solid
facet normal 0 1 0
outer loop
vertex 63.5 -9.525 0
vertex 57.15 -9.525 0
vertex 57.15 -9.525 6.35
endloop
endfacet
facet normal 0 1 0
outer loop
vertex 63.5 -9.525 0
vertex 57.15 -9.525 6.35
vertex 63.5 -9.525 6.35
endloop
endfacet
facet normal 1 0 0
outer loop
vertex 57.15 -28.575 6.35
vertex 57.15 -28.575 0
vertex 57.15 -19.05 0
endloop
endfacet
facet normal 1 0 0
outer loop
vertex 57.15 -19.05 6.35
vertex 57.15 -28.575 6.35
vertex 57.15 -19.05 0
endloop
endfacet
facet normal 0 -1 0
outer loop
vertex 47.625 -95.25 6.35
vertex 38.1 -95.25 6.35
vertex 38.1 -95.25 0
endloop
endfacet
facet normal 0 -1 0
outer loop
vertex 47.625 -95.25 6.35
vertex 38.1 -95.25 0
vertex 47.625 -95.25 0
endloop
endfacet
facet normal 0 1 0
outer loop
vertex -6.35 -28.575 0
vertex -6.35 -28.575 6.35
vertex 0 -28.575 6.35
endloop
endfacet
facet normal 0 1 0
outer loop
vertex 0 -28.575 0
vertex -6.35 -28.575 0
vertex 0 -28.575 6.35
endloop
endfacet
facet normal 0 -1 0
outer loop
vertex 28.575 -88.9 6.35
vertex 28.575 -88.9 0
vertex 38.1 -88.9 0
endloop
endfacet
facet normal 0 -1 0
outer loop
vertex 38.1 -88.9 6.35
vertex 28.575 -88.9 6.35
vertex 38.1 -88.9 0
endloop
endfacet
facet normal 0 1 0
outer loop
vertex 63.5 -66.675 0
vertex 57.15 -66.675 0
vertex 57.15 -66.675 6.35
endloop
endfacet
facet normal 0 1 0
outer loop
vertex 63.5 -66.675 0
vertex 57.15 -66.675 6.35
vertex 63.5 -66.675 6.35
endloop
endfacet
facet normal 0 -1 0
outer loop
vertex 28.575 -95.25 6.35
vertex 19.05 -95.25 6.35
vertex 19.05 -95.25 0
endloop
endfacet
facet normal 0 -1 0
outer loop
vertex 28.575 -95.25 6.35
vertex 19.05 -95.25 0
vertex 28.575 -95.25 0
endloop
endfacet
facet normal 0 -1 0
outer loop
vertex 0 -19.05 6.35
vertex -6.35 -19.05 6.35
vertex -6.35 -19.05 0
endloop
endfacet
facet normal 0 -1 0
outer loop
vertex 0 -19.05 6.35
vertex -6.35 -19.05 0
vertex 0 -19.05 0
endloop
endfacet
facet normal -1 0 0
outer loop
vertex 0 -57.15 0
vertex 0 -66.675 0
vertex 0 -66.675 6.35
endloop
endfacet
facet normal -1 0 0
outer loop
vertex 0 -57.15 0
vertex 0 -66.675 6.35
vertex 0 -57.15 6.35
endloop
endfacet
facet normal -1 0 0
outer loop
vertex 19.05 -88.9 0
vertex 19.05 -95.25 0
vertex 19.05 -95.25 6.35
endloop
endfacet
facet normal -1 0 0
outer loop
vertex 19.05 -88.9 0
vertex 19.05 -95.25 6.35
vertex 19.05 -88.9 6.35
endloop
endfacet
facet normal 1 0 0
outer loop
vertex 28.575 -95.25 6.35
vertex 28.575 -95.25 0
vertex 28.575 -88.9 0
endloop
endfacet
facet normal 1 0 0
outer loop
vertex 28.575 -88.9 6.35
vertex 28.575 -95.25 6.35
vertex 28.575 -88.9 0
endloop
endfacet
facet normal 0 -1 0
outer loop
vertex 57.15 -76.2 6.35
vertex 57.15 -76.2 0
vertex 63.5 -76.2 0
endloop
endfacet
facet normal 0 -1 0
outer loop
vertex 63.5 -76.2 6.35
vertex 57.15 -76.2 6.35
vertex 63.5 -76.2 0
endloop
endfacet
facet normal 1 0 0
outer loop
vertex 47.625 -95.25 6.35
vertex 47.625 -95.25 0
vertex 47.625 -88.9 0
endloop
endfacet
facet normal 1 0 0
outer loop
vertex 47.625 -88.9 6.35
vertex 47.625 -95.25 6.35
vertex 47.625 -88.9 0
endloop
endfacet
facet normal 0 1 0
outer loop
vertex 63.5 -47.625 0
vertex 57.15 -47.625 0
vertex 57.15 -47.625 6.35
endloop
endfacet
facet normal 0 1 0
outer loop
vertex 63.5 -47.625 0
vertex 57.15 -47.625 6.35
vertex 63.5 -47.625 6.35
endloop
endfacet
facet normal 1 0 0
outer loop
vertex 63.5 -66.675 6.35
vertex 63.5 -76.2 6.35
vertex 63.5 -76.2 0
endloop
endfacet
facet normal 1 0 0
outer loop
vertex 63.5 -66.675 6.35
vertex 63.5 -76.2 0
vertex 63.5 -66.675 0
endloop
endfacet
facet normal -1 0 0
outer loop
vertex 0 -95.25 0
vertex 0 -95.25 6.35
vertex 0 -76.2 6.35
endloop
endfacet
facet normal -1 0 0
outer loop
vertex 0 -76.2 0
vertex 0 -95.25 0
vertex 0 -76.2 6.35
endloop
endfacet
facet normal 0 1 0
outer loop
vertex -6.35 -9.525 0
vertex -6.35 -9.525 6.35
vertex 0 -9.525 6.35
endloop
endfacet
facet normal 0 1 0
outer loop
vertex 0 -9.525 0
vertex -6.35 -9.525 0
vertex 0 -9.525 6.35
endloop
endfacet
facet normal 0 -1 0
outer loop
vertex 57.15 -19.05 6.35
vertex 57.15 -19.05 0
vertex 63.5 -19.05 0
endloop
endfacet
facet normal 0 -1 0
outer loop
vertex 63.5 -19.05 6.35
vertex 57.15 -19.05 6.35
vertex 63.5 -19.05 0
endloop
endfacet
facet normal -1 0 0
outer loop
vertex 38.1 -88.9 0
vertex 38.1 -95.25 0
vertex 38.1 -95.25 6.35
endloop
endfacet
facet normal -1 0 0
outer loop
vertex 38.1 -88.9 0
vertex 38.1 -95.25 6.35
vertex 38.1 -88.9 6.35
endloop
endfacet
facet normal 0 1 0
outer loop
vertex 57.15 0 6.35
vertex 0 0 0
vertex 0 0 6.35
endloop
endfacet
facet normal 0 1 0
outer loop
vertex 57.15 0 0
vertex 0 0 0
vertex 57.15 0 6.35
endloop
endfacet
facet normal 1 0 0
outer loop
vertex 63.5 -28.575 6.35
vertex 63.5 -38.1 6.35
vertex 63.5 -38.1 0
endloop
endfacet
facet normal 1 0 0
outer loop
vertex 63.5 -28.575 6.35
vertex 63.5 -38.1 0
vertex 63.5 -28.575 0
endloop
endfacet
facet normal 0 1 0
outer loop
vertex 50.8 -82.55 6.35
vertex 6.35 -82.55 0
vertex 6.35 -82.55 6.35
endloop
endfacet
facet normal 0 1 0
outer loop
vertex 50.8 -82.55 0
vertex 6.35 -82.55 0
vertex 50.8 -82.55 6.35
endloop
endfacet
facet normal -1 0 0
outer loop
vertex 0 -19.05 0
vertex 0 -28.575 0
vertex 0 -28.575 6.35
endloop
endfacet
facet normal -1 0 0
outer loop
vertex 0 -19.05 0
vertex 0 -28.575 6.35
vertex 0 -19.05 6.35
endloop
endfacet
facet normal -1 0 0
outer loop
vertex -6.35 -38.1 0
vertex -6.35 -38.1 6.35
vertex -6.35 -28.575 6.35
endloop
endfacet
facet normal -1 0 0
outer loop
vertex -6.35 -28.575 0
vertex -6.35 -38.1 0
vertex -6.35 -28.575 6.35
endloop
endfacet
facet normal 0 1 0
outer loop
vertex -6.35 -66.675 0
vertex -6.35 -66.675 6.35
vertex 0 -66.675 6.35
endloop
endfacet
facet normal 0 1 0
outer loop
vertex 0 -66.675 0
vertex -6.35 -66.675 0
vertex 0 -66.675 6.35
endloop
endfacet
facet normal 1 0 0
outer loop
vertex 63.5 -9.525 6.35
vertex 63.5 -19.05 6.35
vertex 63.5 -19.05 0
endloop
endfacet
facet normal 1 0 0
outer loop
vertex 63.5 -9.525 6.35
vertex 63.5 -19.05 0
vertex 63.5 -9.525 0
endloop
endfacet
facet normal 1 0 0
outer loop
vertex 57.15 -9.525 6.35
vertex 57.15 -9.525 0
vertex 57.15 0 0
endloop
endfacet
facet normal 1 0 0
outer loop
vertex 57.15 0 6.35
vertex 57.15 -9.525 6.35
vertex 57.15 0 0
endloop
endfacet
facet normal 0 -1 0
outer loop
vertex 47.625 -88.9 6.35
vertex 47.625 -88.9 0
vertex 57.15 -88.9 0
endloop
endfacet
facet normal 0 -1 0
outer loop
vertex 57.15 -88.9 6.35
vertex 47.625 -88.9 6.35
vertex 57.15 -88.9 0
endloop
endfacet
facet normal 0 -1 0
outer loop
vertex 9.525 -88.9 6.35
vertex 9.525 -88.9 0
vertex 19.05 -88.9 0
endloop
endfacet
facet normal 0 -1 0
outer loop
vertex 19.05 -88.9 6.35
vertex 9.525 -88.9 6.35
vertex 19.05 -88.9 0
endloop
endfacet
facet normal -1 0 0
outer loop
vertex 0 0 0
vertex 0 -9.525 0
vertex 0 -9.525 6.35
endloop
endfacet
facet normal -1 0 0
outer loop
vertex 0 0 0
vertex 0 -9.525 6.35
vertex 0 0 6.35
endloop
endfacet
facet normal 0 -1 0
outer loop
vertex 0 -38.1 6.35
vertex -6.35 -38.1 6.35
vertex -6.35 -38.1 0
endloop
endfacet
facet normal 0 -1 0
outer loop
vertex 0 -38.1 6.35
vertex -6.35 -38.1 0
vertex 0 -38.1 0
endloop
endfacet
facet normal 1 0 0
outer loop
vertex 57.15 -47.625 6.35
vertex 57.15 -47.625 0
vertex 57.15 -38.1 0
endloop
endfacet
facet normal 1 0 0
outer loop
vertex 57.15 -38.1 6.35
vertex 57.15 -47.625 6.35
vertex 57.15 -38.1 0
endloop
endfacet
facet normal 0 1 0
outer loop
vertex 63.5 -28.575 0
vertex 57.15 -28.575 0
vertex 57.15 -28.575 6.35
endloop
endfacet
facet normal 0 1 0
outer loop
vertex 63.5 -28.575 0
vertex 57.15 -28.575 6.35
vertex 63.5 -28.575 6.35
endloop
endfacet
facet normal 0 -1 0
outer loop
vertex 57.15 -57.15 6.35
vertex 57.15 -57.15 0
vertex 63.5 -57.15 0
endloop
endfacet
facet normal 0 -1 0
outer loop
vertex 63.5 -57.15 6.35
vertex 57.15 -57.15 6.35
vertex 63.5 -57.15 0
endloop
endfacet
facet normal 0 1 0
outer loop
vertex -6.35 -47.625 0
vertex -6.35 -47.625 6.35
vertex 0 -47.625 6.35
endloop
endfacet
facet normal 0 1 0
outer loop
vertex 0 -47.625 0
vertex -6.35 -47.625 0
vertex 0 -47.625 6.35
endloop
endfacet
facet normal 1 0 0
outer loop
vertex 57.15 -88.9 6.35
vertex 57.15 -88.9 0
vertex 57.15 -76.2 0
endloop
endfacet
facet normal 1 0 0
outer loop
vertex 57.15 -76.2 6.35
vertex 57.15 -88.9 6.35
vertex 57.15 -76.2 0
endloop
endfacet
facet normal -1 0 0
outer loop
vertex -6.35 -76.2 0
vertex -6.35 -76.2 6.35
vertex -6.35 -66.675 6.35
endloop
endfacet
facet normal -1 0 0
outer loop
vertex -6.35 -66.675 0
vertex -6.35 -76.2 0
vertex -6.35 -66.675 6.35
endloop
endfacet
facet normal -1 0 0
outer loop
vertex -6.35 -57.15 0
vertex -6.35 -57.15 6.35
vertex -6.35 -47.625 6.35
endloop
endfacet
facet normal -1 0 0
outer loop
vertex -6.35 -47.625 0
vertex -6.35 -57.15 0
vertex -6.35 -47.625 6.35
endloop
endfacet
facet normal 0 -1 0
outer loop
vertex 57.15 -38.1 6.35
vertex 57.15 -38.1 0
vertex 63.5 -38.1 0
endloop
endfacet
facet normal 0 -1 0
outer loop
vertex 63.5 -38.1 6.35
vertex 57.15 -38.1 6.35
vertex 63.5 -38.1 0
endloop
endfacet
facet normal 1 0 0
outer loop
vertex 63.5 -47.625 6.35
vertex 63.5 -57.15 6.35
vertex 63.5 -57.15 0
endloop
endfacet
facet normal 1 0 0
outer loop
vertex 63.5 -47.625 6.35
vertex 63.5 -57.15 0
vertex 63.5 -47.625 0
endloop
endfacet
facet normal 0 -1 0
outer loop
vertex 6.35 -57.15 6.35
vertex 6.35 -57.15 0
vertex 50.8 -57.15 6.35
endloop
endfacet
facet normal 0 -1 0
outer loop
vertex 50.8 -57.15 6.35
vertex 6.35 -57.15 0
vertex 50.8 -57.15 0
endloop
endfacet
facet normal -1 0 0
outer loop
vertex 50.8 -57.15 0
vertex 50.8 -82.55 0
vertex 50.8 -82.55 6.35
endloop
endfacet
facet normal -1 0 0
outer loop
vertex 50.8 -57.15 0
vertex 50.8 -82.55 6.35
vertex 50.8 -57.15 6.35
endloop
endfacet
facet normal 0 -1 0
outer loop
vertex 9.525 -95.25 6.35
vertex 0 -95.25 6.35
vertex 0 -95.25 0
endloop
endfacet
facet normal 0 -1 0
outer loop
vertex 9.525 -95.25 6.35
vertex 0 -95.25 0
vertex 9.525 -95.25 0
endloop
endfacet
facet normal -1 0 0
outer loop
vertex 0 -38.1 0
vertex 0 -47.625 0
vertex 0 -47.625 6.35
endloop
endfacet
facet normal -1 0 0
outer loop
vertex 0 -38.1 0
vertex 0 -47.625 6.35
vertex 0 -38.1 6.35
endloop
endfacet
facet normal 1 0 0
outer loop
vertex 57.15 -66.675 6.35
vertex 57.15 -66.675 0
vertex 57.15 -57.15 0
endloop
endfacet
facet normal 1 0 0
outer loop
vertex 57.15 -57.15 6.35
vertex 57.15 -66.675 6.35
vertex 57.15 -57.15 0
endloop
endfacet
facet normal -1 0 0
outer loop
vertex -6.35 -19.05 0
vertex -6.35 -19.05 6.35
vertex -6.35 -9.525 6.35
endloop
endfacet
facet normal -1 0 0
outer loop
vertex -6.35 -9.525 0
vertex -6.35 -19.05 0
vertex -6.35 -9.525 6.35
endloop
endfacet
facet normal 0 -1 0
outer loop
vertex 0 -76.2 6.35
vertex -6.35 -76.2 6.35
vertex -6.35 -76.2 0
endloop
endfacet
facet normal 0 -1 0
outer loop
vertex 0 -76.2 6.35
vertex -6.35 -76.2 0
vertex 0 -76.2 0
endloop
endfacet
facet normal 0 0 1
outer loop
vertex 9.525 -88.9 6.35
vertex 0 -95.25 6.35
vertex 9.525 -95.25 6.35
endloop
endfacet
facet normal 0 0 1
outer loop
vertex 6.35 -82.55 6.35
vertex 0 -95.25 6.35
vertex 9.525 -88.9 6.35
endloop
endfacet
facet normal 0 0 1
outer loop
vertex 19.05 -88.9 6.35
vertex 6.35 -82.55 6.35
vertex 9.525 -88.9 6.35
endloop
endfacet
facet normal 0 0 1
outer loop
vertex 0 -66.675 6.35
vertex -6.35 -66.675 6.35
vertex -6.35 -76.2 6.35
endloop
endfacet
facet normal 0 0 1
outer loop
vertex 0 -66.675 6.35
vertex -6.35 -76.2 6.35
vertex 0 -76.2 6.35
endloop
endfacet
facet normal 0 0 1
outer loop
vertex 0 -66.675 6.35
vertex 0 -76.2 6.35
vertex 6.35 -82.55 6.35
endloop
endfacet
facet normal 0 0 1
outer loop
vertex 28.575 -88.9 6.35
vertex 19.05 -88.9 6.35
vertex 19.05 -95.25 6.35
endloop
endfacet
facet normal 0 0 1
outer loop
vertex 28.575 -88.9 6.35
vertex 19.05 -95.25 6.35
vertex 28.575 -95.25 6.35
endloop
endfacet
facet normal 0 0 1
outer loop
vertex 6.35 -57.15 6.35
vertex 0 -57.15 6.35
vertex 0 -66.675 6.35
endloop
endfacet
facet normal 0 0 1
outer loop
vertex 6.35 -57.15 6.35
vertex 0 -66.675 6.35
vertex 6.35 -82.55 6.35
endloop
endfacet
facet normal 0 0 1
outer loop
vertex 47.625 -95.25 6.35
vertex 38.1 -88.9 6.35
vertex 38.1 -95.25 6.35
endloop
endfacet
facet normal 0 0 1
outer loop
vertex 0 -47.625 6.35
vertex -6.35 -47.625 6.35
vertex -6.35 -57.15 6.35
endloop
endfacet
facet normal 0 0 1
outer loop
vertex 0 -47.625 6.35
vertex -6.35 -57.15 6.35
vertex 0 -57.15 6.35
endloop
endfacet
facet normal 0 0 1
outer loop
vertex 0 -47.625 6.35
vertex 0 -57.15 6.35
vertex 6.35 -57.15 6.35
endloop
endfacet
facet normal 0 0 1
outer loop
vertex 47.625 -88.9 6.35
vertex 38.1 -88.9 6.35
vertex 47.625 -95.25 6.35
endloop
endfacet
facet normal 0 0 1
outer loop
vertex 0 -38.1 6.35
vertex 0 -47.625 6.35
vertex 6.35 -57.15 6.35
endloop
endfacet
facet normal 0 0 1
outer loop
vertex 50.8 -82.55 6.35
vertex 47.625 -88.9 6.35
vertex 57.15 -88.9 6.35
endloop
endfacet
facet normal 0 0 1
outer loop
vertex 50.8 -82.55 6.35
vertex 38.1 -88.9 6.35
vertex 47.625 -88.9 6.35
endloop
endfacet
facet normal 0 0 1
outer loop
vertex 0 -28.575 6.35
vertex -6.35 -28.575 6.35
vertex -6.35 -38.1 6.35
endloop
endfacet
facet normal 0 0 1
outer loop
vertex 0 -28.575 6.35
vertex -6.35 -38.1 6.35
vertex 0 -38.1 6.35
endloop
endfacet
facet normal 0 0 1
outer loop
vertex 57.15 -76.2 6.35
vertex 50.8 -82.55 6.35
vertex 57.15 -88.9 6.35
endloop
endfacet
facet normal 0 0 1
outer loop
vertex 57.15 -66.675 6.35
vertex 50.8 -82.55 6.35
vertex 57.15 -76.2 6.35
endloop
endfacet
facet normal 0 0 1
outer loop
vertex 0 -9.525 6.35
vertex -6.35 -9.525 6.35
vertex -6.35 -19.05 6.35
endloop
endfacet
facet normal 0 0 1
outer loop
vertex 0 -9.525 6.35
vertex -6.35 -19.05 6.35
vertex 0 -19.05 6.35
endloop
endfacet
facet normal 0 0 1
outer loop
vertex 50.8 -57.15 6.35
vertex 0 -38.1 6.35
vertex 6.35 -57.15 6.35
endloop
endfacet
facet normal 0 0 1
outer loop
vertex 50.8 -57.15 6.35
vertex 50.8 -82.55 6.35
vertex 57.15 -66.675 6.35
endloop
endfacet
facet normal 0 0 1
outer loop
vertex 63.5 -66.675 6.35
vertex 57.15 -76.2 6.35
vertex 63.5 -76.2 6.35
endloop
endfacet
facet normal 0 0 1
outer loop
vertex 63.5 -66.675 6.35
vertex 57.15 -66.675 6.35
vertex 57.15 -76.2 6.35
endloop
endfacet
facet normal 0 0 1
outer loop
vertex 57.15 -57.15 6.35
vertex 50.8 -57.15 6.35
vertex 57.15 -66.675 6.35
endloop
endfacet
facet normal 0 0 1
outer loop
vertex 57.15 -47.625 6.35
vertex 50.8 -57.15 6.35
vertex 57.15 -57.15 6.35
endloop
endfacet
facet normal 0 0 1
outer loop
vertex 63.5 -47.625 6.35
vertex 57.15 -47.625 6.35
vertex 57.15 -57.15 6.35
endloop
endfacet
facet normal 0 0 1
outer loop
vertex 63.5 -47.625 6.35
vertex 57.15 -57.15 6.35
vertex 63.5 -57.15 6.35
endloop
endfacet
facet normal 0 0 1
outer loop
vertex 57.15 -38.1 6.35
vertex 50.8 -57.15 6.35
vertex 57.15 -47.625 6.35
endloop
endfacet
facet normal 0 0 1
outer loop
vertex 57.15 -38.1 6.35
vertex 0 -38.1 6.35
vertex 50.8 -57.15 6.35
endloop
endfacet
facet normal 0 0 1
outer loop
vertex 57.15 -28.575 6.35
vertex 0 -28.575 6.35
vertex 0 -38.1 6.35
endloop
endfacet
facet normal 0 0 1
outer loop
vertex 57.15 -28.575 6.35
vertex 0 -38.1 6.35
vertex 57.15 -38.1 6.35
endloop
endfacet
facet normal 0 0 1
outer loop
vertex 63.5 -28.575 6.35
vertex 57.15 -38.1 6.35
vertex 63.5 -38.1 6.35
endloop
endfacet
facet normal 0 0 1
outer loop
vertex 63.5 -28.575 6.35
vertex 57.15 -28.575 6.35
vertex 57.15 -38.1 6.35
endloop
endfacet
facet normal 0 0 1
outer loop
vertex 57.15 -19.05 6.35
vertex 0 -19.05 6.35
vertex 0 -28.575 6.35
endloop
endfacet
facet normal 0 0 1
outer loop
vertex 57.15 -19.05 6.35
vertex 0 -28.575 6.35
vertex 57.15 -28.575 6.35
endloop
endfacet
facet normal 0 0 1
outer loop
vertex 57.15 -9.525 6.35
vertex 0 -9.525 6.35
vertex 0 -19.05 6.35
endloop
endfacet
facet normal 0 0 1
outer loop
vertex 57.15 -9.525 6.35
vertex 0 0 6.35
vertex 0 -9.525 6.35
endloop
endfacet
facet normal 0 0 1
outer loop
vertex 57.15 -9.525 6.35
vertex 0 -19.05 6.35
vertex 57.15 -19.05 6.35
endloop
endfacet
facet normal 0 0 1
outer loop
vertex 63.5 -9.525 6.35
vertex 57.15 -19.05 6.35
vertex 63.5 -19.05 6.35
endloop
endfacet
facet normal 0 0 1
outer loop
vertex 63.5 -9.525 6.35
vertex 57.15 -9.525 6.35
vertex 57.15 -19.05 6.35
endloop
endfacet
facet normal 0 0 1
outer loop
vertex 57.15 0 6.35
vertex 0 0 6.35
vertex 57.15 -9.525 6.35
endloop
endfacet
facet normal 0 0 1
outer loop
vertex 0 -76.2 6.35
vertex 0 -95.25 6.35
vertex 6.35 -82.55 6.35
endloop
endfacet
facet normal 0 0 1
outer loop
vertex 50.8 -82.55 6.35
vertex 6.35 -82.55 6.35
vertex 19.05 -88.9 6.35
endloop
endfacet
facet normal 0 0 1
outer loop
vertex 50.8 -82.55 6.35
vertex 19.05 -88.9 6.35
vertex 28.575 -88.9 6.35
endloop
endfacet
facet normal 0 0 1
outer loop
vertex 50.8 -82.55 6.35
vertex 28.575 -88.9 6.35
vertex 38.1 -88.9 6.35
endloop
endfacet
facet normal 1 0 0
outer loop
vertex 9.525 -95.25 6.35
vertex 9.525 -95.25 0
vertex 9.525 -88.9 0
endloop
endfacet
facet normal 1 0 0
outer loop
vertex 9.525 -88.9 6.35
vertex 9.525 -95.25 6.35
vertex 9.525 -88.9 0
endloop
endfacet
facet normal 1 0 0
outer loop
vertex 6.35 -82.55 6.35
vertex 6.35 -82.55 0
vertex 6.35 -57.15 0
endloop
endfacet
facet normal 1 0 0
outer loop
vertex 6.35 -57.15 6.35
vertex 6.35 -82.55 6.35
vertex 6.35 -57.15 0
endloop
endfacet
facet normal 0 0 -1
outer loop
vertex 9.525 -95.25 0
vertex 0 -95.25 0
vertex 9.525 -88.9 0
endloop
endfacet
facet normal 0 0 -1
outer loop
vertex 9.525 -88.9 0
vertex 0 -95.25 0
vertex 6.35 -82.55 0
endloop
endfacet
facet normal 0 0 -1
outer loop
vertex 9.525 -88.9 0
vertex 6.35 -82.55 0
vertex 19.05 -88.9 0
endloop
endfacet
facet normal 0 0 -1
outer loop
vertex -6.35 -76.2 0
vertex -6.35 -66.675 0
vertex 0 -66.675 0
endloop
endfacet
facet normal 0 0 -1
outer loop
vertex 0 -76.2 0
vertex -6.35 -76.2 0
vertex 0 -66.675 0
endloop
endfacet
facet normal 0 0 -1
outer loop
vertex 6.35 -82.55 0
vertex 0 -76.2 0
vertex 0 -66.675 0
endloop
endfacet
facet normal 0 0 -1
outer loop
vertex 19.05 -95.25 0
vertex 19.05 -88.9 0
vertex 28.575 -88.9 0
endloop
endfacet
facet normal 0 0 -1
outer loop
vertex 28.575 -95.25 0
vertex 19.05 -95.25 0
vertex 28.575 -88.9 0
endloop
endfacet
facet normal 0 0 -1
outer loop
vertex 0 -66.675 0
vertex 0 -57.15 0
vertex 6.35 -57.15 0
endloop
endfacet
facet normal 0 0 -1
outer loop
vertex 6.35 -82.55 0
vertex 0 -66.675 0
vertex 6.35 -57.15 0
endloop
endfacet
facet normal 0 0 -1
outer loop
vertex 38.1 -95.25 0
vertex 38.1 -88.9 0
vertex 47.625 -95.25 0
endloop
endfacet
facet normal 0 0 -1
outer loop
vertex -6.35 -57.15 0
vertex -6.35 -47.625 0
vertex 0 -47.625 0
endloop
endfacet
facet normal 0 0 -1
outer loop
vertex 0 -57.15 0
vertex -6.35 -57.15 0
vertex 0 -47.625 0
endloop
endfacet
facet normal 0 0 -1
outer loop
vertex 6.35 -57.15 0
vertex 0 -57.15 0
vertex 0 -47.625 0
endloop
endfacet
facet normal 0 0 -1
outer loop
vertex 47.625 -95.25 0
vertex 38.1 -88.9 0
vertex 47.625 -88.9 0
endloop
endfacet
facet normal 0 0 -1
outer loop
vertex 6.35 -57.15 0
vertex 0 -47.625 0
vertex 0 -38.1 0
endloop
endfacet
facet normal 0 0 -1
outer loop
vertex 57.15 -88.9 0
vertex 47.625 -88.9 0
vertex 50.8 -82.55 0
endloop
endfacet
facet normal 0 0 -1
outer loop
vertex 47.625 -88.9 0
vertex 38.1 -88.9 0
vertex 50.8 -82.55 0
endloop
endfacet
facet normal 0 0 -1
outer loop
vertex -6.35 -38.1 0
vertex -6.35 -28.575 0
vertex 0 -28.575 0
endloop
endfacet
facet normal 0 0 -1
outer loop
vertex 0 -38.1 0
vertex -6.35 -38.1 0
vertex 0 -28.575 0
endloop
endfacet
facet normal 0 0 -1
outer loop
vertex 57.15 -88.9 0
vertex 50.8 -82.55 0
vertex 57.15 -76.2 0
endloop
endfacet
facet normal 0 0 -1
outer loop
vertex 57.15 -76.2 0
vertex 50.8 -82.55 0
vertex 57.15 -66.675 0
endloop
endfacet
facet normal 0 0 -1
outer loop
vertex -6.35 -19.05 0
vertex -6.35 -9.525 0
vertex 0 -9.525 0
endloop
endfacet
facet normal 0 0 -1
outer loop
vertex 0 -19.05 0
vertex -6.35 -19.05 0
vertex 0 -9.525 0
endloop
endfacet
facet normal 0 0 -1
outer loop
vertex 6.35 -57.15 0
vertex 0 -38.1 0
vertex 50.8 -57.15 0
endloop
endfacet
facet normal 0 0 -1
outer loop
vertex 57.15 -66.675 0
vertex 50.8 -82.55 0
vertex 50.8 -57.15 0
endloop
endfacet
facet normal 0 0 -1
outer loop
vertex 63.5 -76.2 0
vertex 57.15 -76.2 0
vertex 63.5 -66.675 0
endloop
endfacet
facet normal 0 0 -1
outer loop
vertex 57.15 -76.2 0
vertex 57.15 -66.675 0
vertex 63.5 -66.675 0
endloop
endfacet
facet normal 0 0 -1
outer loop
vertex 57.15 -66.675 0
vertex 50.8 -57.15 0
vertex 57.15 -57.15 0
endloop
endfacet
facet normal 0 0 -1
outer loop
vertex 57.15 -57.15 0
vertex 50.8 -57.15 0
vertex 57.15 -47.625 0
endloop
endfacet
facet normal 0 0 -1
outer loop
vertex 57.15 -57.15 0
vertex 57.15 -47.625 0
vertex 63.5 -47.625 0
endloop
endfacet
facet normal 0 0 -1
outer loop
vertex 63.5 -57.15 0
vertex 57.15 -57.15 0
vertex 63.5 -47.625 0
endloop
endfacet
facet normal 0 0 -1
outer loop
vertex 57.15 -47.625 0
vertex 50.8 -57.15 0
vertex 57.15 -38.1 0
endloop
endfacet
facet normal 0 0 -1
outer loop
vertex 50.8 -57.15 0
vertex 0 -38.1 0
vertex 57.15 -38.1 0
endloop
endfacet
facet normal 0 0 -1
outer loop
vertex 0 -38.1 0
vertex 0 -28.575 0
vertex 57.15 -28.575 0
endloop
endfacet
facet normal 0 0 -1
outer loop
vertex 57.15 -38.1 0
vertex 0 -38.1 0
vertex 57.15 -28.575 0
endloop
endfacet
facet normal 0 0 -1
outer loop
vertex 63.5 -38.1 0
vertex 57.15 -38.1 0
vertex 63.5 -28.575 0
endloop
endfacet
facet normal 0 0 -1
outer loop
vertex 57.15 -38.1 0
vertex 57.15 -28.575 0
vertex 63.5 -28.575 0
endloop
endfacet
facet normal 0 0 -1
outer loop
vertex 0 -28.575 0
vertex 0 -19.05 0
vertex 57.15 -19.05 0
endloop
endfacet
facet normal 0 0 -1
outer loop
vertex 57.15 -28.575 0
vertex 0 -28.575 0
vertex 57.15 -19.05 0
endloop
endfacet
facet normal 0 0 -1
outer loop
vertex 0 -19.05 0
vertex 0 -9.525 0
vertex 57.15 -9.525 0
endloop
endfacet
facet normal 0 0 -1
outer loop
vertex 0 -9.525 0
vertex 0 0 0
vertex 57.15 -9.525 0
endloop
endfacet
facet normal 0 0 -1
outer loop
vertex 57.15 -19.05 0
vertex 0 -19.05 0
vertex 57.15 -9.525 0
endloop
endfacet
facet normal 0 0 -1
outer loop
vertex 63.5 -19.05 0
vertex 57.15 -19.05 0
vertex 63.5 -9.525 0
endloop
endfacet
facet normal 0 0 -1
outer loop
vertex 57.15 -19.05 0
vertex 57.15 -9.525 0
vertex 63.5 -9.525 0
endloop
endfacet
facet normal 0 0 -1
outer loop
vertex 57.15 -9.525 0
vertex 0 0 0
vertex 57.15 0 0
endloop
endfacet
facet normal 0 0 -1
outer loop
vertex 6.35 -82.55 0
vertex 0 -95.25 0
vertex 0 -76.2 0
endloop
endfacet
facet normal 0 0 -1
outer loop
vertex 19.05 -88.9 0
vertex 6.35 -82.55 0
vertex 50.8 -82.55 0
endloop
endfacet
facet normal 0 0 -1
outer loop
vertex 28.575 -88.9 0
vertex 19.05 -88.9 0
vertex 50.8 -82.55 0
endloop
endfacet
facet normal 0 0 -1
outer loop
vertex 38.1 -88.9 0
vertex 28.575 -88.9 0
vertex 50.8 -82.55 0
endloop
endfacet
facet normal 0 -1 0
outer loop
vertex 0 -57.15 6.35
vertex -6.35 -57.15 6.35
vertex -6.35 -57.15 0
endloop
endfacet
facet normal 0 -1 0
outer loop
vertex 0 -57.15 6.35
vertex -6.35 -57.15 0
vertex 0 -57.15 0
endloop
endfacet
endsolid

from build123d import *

# Parameters (mm, degrees)
SKETCH1_W           = 57.15
SKETCH1_H           = 88.9
SKETCH1_W_2         = 44.45
SKETCH1_H_2         = 25.4
BOSS_EXTRUDE1_DEPTH = 6.35
SKETCH2_W           = 6.35
SKETCH2_H           = 9.525
SKETCH2_W_2         = 9.525
SKETCH2_H_2         = 6.35
BOSS_EXTRUDE3_DEPTH = 6.35


with BuildPart() as part:
    # Sketch1 → Boss-Extrude1 (new body)
    with BuildSketch(Plane.XY):
        with Locations((28.575, -44.45)):
            Rectangle(SKETCH1_W, SKETCH1_H)
        with Locations((28.575, -69.85)):
            Rectangle(SKETCH1_W_2, SKETCH1_H_2, mode=Mode.SUBTRACT)
    extrude(amount=BOSS_EXTRUDE1_DEPTH)

    # Sketch2 → Boss-Extrude3 (add)
    with BuildSketch(Plane.XY.offset(6.35)):
        with Locations((-3.175, -14.2875)):
            Rectangle(SKETCH2_W, SKETCH2_H)
        with Locations((-3.175, -33.3375)):
            Rectangle(SKETCH2_W, SKETCH2_H)
        with Locations((-3.175, -52.3875)):
            Rectangle(SKETCH2_W, SKETCH2_H)
        with Locations((-3.175, -71.4375)):
            Rectangle(SKETCH2_W, SKETCH2_H)
        with Locations((4.7625, -92.075)):
            Rectangle(SKETCH2_W_2, SKETCH2_H_2)
        with Locations((23.8125, -92.075)):
            Rectangle(SKETCH2_W_2, SKETCH2_H_2)
        with Locations((42.8625, -92.075)):
            Rectangle(SKETCH2_W_2, SKETCH2_H_2)
        with Locations((60.325, -14.2875)):
            Rectangle(SKETCH2_W, SKETCH2_H)
        with Locations((60.325, -33.3375)):
            Rectangle(SKETCH2_W, SKETCH2_H)
        with Locations((60.325, -71.4375)):
            Rectangle(SKETCH2_W, SKETCH2_H)
        with Locations((60.325, -52.3875)):
            Rectangle(SKETCH2_W, SKETCH2_H)
    extrude(amount=-BOSS_EXTRUDE3_DEPTH)


solid = part.part
